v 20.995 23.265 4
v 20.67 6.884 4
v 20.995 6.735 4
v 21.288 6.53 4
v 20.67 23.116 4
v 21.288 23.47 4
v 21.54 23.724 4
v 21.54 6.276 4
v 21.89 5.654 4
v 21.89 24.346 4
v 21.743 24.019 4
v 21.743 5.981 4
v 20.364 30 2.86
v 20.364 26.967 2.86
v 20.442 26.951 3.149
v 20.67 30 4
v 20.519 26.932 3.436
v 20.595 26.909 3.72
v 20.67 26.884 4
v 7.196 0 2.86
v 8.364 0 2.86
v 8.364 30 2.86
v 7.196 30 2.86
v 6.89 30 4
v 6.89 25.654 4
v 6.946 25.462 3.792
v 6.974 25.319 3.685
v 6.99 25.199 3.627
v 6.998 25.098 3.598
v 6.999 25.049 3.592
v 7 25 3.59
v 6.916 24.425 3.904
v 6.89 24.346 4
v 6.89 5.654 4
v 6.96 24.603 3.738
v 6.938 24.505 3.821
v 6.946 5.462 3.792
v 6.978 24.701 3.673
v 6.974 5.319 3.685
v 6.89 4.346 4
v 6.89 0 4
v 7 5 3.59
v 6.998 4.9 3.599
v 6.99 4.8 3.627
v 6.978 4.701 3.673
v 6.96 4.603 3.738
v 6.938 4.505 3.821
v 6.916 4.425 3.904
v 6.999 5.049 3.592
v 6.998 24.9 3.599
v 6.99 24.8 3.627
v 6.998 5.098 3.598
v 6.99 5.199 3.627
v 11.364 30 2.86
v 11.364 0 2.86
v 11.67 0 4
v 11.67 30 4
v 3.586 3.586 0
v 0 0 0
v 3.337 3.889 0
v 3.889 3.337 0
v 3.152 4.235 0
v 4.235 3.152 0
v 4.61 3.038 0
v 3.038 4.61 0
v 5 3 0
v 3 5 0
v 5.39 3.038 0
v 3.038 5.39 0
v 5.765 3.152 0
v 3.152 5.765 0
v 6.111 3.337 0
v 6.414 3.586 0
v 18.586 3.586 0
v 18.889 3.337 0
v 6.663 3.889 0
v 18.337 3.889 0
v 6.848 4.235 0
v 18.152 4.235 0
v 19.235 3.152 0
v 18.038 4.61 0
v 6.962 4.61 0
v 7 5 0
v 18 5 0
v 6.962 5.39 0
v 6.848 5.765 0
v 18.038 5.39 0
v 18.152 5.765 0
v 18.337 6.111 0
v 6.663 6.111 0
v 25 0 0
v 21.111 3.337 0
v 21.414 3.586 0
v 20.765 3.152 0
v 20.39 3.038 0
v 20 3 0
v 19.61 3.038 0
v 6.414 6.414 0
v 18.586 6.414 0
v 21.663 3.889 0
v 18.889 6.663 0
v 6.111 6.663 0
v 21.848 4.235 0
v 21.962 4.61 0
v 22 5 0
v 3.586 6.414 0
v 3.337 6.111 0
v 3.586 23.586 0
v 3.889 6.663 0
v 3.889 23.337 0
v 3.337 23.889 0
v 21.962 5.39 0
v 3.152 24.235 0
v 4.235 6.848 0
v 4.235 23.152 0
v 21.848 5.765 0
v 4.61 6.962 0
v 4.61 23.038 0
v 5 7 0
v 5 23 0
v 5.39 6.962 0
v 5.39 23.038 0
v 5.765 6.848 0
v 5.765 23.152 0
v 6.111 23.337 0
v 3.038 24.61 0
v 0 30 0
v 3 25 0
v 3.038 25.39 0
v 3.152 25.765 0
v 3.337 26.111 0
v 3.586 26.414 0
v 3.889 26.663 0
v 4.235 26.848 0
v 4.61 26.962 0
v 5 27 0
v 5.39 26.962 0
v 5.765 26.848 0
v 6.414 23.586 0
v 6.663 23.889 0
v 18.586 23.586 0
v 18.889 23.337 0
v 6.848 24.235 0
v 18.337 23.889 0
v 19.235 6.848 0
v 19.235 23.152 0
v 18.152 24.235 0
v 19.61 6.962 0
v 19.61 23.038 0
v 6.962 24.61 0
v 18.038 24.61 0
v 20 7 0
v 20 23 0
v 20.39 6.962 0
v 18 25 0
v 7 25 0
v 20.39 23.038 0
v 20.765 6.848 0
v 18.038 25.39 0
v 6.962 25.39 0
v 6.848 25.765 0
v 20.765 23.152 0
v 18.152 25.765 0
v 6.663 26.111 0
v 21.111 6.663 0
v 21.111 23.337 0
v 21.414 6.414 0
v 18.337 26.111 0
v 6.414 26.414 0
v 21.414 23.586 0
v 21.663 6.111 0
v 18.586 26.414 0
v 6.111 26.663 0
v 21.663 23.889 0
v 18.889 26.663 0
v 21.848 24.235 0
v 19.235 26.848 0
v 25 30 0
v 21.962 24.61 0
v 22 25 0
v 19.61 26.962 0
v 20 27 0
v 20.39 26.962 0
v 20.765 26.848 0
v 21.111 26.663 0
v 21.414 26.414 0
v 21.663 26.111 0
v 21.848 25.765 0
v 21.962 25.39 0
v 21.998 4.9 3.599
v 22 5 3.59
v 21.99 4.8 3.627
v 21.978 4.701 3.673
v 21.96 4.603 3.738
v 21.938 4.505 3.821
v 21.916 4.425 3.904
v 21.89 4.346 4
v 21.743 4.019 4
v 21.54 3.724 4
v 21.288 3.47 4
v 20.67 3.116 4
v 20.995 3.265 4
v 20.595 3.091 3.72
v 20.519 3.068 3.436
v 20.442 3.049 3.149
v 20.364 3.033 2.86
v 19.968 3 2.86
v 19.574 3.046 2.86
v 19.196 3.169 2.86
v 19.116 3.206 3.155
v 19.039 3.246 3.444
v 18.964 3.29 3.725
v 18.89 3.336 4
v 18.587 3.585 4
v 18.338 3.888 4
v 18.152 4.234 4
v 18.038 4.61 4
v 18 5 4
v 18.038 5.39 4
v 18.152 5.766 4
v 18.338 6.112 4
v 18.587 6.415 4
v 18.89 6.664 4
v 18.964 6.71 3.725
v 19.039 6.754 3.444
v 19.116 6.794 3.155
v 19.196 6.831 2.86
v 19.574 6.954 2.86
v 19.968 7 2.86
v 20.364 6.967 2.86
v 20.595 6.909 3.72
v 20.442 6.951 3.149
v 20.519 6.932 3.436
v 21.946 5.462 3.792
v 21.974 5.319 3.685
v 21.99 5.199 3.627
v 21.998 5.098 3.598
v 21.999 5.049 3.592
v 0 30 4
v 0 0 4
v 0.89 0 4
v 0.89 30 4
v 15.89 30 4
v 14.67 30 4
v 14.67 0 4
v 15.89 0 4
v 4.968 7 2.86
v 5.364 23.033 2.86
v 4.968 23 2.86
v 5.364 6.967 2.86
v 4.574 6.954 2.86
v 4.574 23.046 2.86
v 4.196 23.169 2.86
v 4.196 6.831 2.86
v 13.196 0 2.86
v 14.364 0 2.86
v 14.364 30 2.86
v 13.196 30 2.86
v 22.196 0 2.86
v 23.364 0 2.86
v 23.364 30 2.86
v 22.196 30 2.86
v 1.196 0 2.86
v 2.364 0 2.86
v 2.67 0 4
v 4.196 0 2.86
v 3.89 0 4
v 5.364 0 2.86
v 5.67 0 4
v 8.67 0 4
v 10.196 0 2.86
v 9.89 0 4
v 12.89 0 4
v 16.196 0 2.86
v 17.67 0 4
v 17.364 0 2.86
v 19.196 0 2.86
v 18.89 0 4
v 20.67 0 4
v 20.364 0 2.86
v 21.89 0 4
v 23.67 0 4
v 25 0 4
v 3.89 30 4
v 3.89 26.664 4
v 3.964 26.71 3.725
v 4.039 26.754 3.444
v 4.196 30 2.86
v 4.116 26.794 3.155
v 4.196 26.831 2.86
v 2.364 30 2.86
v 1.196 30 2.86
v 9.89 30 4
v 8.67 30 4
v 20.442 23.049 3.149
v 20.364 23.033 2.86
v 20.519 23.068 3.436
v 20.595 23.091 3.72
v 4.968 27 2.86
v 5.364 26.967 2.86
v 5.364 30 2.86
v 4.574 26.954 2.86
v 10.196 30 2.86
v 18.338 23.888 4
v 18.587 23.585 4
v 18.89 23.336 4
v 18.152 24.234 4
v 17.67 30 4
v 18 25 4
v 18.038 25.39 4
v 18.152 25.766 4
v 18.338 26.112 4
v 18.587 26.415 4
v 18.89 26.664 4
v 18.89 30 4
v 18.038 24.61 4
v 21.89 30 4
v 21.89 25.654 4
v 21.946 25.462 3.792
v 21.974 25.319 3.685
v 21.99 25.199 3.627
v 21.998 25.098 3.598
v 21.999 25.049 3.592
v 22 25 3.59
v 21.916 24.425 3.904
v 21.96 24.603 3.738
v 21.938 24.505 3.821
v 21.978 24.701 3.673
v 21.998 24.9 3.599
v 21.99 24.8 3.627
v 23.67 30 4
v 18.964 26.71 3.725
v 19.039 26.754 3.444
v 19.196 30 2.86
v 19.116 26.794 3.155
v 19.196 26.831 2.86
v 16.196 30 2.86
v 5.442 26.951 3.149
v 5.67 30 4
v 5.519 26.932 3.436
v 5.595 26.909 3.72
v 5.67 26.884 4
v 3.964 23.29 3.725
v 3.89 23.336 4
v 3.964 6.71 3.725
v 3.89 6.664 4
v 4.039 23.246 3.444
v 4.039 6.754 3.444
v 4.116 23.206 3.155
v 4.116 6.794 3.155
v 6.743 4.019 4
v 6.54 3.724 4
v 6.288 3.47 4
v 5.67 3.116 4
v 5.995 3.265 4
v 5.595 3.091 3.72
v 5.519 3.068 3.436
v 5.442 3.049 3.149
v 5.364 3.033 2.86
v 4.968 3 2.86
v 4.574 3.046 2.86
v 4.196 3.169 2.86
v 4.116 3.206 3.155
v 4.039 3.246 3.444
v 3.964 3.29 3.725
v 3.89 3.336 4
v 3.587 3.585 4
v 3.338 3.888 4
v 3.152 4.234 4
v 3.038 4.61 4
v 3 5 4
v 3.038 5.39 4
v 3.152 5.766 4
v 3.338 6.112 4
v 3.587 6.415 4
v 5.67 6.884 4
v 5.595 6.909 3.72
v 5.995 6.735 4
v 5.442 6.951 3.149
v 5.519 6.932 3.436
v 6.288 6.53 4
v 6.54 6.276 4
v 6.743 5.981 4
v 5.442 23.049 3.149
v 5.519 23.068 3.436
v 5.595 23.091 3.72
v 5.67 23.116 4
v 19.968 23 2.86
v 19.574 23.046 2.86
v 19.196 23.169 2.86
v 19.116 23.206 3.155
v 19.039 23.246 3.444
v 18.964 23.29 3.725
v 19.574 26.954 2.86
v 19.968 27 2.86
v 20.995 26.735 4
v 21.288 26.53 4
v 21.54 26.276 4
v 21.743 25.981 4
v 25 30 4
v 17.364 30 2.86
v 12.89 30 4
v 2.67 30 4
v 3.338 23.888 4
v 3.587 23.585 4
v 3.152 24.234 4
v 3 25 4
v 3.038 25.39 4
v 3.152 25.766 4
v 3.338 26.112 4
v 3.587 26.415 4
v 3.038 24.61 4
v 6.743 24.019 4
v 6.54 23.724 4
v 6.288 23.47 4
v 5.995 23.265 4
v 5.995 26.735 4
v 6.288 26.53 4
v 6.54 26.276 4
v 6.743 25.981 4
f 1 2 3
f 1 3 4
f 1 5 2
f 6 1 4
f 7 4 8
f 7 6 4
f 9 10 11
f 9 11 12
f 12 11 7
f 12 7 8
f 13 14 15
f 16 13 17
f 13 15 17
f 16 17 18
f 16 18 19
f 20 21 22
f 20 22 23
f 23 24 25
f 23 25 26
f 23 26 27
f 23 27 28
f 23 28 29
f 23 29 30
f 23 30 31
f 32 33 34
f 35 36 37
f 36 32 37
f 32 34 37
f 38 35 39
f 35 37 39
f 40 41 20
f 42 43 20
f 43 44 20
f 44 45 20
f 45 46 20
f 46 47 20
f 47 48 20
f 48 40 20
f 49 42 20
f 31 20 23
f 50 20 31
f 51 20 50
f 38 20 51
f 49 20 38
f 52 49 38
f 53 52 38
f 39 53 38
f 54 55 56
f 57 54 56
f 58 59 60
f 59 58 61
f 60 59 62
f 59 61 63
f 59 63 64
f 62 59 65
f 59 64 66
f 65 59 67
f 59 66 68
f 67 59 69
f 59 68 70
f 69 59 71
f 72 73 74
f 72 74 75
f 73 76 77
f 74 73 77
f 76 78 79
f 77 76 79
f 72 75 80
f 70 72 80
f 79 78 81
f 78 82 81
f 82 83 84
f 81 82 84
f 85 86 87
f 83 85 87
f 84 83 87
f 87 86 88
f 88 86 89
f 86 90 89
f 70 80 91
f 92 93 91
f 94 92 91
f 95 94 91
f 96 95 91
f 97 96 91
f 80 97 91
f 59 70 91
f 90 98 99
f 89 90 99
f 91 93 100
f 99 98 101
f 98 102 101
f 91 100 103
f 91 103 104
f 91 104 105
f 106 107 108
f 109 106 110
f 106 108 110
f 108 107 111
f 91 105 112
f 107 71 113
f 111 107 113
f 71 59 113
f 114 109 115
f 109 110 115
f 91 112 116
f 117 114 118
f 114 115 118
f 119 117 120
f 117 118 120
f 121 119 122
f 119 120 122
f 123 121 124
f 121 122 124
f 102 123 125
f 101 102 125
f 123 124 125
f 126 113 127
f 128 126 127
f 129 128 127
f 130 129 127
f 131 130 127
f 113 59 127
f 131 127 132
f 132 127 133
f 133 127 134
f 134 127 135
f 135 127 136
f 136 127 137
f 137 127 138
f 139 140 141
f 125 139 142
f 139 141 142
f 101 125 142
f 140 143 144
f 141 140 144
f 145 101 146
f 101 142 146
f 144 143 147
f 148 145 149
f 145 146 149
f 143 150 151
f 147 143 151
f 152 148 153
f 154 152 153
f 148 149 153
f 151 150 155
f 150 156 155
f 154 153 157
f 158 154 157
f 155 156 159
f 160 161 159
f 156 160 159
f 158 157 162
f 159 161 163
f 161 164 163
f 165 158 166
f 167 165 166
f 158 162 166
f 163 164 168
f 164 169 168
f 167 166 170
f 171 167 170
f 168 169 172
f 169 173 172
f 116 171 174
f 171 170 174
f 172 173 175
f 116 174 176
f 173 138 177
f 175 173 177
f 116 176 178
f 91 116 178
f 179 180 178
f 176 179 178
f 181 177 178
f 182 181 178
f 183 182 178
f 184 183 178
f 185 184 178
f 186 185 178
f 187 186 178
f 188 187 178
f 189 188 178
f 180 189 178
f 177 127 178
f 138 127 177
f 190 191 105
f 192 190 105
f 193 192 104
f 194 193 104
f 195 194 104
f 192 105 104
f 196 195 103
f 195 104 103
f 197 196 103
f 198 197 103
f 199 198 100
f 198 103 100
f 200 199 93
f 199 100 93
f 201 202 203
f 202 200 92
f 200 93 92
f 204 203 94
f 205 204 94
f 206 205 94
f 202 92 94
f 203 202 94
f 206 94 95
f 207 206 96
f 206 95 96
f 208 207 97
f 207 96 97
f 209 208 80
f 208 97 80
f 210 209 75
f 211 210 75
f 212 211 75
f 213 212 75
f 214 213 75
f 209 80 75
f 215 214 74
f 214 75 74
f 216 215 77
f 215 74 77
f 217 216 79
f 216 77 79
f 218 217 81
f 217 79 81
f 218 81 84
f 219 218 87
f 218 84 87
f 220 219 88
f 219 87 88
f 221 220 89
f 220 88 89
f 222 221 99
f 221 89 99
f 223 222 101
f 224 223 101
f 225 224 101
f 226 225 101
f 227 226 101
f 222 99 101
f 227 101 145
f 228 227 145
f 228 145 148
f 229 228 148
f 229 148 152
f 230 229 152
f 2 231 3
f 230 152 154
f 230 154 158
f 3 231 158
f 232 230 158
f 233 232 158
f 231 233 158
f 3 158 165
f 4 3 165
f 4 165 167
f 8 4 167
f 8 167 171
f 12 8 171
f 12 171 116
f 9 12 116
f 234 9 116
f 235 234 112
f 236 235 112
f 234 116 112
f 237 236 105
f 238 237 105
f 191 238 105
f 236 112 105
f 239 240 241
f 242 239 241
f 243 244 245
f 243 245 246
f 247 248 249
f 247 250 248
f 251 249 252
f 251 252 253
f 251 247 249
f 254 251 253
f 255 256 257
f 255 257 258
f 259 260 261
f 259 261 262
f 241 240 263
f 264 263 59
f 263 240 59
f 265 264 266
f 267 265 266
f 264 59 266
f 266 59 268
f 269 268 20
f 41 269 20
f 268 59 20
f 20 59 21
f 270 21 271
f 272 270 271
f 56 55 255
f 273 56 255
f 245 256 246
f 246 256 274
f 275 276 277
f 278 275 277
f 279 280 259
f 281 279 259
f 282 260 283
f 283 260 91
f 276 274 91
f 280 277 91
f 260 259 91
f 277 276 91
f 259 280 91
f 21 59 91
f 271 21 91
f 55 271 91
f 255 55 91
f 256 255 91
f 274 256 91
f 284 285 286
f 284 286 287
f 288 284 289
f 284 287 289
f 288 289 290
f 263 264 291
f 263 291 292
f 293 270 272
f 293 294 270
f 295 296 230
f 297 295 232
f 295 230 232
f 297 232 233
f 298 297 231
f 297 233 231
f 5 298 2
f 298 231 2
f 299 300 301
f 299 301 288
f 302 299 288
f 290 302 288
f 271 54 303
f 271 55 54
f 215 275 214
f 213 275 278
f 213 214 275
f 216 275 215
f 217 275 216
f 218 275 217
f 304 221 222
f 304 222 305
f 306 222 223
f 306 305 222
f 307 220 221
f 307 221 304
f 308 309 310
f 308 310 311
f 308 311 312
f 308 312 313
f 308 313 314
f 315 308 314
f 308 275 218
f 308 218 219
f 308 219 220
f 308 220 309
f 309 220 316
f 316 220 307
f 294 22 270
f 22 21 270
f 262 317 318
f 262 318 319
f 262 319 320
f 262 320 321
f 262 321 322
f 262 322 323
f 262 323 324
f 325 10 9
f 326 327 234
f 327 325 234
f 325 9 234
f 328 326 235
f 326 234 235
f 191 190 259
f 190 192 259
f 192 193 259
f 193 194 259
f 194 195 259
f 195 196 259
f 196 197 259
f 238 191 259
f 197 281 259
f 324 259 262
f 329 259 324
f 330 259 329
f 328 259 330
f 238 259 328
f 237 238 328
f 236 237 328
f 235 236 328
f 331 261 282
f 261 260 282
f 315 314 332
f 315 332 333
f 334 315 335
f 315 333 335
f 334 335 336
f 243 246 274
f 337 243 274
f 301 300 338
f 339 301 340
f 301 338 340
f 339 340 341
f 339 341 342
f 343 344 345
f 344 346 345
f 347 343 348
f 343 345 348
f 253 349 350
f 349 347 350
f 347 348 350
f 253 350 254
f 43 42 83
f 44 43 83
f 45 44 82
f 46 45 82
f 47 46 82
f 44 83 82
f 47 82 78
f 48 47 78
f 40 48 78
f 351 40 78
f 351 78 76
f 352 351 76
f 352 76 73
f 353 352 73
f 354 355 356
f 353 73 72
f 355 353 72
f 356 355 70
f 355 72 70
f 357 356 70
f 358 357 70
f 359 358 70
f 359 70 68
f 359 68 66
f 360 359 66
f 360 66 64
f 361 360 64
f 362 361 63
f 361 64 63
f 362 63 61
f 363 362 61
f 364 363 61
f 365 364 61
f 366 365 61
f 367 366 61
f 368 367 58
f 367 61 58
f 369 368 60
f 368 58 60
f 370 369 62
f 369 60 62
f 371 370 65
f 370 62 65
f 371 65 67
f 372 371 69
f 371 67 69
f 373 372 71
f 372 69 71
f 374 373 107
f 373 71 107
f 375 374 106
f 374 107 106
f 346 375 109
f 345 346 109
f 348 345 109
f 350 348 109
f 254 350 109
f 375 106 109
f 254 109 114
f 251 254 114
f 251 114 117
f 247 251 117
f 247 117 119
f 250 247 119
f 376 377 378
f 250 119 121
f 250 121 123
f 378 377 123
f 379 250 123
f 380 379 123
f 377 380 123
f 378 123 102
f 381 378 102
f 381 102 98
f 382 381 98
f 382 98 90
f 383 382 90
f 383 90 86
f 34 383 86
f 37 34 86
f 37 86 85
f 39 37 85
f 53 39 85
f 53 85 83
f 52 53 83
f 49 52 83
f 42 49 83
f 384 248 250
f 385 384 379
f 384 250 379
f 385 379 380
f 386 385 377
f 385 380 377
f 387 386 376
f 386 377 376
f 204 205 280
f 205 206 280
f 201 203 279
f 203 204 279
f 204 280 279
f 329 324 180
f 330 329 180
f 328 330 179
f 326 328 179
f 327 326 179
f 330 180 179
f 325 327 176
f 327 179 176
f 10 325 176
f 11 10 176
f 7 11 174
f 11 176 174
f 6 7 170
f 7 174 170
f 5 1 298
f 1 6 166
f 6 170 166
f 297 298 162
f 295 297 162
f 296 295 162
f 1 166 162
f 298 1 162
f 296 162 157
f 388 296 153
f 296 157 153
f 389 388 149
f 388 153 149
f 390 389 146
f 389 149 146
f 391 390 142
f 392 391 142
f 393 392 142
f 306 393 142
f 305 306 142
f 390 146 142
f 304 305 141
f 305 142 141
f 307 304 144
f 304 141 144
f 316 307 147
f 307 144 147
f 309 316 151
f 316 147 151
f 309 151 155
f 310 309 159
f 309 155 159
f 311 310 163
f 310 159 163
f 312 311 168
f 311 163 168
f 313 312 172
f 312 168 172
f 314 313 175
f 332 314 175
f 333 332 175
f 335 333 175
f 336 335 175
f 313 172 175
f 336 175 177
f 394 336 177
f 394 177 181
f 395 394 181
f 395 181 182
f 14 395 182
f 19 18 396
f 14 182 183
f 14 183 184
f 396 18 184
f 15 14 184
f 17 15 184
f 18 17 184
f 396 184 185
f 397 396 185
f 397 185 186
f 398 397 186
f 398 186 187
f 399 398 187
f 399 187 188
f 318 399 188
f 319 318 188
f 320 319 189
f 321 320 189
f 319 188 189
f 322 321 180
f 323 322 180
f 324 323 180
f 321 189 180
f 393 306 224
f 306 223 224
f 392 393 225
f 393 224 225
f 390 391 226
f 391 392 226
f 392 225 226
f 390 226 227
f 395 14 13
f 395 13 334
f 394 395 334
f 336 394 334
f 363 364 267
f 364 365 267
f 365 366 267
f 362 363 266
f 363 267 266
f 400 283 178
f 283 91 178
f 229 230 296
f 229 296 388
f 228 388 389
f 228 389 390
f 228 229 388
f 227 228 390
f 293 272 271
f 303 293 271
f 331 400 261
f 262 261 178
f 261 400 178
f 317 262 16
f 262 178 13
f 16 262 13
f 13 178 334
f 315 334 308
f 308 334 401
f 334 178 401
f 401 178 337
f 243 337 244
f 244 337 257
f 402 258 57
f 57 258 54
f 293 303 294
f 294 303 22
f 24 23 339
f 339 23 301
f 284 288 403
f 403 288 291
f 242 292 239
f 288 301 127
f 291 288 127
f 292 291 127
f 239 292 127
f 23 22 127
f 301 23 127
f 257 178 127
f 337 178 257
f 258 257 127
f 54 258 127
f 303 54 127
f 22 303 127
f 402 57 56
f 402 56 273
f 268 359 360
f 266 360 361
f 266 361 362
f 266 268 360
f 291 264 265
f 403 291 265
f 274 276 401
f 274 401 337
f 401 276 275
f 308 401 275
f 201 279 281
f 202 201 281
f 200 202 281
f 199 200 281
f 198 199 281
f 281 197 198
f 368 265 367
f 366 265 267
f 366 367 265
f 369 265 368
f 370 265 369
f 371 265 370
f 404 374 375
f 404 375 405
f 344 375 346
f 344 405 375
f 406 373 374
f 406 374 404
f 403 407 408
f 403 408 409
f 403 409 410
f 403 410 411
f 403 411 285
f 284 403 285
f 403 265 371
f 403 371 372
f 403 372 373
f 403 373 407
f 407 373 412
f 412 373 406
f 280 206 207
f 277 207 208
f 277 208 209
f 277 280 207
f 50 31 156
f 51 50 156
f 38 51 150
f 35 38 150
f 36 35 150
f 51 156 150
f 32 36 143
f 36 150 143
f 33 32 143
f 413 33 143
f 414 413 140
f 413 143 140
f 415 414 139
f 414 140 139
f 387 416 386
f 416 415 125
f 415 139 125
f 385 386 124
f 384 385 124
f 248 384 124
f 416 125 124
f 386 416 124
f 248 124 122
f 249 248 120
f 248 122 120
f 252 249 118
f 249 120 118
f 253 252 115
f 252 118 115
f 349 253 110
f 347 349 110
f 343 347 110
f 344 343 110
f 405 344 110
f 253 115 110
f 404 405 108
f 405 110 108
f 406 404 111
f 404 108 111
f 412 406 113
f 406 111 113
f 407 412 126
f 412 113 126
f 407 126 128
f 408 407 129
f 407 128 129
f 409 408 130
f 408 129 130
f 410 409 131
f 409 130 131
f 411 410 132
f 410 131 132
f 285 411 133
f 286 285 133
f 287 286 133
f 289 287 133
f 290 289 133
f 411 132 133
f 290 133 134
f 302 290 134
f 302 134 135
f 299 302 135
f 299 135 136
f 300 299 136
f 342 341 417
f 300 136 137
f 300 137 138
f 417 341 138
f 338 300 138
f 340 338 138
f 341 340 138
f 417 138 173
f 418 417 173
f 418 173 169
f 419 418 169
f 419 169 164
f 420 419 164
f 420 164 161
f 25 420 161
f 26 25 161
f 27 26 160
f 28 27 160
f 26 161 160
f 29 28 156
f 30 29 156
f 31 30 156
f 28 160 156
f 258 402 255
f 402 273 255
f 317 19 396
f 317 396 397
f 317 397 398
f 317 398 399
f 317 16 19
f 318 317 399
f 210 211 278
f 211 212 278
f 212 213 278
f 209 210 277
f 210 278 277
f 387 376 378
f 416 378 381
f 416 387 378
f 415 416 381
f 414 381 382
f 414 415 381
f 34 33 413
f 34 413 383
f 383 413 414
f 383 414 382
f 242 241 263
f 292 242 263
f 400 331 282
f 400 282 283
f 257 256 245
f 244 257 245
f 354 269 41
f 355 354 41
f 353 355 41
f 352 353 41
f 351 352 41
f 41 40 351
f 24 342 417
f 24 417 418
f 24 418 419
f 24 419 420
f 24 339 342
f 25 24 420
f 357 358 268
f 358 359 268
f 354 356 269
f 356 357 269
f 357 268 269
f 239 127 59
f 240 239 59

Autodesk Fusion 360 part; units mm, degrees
sketch "Sketch1" plane through (0, 0, 0) normal (0, 0, 1) x (1, 0, 0)
  line L0 (0, 0) -> (25, 0)
  line L1 (25, 0) -> (25, 30)
  line L2 (25, 30) -> (0, 30)
  line L3 (0, 30) -> (0, 0)
  dimension "d1" = 25
  dimension "d2" = 30
extrude "Extrude1" add sketch "Sketch1" along normal blind 4
sketch "Sketch2" plane through (0, 0, 0) normal (0, -1, 0) x (1, 0, 0)
  line L0 (0, 0) -> (25, 0)
  line L1 (25, 0) -> (25, 4)
  line L2 (25, 4) -> (0, 4)
  line L3 (0, 4) -> (0, 0)
  line L4 (25, 2.86) -> (0, 2.86)
  line L5 (0.89, 4) -> (1.1955, 2.86)
  line L6 (2.3645, 2.86) -> (2.67, 4)
  line L7 (3.89, 4) -> (4.1955, 2.86)
  line L8 (5.3645, 2.86) -> (5.67, 4)
  line L9 (6.89, 4) -> (7.1955, 2.86)
  line L10 (8.3645, 2.86) -> (8.67, 4)
  line L11 (9.89, 4) -> (10.1955, 2.86)
  line L12 (11.3645, 2.86) -> (11.67, 4)
  line L13 (12.89, 4) -> (13.1955, 2.86)
  line L14 (14.3645, 2.86) -> (14.67, 4)
  line L15 (15.89, 4) -> (16.1955, 2.86)
  line L16 (17.3645, 2.86) -> (17.67, 4)
  line L17 (18.89, 4) -> (19.1955, 2.86)
  line L18 (20.3645, 2.86) -> (20.67, 4)
  line L19 (21.89, 4) -> (22.1955, 2.86)
  line L20 (23.3645, 2.86) -> (23.67, 4)
  dimension "d5" = 1.14
  dimension "d7" = 1.78
  dimension "d8" = 0.89
  dimension "d11" = 3
  dimension "d12" = 0
  dimension "d15" = 30
extrude "Extrude2" cut sketch "Sketch2" against normal up to surface (30 mm away) contours L2 L4 L5 L6 | L2 L4 L19 L20 | L2 L4 L7 L8 | L2 L4 L17 L18 | L2 L4 L9 L10 | L2 L4 L15 L16 | L2 L4 L11 L12 | L2 L4 L13 L14
sketch "Sketch3" plane through (0, 0, 0) normal (0, 0, -1) x (1, 0, 0)
  line L0 (0, 0) -> (0, -30)
  line L1 (0, -30) -> (25, -30)
  line L2 (25, -30) -> (25, 0)
  line L3 (25, 0) -> (0, 0)
  line L4 (20, -25) -> (5, -25) construction
  line L5 (5, -25) -> (5, -5) construction
  line L6 (5, -5) -> (20, -5) construction
  line L7 (20, -5) -> (20, -25) construction
  circle A0 centre (20, -25) radius 2
  circle A1 centre (5, -25) radius 2
  circle A2 centre (20, -5) radius 2
  circle A3 centre (5, -5) radius 2
  point P0 (12.5, -25)
  point P1 (5, -15)
  point P2 (0, -15)
  point P3 (12.5, -30)
  dimension "d16" = 15
  dimension "d17" = 20
  dimension "d18" = 4
  dimension "d19" = 4
extrude "Extrude3" cut sketch "Sketch3" against normal through all contours A0 | A1 | A2 | A3
equation "d8 = ( 1.78 / 2 ) * 1 mm"
